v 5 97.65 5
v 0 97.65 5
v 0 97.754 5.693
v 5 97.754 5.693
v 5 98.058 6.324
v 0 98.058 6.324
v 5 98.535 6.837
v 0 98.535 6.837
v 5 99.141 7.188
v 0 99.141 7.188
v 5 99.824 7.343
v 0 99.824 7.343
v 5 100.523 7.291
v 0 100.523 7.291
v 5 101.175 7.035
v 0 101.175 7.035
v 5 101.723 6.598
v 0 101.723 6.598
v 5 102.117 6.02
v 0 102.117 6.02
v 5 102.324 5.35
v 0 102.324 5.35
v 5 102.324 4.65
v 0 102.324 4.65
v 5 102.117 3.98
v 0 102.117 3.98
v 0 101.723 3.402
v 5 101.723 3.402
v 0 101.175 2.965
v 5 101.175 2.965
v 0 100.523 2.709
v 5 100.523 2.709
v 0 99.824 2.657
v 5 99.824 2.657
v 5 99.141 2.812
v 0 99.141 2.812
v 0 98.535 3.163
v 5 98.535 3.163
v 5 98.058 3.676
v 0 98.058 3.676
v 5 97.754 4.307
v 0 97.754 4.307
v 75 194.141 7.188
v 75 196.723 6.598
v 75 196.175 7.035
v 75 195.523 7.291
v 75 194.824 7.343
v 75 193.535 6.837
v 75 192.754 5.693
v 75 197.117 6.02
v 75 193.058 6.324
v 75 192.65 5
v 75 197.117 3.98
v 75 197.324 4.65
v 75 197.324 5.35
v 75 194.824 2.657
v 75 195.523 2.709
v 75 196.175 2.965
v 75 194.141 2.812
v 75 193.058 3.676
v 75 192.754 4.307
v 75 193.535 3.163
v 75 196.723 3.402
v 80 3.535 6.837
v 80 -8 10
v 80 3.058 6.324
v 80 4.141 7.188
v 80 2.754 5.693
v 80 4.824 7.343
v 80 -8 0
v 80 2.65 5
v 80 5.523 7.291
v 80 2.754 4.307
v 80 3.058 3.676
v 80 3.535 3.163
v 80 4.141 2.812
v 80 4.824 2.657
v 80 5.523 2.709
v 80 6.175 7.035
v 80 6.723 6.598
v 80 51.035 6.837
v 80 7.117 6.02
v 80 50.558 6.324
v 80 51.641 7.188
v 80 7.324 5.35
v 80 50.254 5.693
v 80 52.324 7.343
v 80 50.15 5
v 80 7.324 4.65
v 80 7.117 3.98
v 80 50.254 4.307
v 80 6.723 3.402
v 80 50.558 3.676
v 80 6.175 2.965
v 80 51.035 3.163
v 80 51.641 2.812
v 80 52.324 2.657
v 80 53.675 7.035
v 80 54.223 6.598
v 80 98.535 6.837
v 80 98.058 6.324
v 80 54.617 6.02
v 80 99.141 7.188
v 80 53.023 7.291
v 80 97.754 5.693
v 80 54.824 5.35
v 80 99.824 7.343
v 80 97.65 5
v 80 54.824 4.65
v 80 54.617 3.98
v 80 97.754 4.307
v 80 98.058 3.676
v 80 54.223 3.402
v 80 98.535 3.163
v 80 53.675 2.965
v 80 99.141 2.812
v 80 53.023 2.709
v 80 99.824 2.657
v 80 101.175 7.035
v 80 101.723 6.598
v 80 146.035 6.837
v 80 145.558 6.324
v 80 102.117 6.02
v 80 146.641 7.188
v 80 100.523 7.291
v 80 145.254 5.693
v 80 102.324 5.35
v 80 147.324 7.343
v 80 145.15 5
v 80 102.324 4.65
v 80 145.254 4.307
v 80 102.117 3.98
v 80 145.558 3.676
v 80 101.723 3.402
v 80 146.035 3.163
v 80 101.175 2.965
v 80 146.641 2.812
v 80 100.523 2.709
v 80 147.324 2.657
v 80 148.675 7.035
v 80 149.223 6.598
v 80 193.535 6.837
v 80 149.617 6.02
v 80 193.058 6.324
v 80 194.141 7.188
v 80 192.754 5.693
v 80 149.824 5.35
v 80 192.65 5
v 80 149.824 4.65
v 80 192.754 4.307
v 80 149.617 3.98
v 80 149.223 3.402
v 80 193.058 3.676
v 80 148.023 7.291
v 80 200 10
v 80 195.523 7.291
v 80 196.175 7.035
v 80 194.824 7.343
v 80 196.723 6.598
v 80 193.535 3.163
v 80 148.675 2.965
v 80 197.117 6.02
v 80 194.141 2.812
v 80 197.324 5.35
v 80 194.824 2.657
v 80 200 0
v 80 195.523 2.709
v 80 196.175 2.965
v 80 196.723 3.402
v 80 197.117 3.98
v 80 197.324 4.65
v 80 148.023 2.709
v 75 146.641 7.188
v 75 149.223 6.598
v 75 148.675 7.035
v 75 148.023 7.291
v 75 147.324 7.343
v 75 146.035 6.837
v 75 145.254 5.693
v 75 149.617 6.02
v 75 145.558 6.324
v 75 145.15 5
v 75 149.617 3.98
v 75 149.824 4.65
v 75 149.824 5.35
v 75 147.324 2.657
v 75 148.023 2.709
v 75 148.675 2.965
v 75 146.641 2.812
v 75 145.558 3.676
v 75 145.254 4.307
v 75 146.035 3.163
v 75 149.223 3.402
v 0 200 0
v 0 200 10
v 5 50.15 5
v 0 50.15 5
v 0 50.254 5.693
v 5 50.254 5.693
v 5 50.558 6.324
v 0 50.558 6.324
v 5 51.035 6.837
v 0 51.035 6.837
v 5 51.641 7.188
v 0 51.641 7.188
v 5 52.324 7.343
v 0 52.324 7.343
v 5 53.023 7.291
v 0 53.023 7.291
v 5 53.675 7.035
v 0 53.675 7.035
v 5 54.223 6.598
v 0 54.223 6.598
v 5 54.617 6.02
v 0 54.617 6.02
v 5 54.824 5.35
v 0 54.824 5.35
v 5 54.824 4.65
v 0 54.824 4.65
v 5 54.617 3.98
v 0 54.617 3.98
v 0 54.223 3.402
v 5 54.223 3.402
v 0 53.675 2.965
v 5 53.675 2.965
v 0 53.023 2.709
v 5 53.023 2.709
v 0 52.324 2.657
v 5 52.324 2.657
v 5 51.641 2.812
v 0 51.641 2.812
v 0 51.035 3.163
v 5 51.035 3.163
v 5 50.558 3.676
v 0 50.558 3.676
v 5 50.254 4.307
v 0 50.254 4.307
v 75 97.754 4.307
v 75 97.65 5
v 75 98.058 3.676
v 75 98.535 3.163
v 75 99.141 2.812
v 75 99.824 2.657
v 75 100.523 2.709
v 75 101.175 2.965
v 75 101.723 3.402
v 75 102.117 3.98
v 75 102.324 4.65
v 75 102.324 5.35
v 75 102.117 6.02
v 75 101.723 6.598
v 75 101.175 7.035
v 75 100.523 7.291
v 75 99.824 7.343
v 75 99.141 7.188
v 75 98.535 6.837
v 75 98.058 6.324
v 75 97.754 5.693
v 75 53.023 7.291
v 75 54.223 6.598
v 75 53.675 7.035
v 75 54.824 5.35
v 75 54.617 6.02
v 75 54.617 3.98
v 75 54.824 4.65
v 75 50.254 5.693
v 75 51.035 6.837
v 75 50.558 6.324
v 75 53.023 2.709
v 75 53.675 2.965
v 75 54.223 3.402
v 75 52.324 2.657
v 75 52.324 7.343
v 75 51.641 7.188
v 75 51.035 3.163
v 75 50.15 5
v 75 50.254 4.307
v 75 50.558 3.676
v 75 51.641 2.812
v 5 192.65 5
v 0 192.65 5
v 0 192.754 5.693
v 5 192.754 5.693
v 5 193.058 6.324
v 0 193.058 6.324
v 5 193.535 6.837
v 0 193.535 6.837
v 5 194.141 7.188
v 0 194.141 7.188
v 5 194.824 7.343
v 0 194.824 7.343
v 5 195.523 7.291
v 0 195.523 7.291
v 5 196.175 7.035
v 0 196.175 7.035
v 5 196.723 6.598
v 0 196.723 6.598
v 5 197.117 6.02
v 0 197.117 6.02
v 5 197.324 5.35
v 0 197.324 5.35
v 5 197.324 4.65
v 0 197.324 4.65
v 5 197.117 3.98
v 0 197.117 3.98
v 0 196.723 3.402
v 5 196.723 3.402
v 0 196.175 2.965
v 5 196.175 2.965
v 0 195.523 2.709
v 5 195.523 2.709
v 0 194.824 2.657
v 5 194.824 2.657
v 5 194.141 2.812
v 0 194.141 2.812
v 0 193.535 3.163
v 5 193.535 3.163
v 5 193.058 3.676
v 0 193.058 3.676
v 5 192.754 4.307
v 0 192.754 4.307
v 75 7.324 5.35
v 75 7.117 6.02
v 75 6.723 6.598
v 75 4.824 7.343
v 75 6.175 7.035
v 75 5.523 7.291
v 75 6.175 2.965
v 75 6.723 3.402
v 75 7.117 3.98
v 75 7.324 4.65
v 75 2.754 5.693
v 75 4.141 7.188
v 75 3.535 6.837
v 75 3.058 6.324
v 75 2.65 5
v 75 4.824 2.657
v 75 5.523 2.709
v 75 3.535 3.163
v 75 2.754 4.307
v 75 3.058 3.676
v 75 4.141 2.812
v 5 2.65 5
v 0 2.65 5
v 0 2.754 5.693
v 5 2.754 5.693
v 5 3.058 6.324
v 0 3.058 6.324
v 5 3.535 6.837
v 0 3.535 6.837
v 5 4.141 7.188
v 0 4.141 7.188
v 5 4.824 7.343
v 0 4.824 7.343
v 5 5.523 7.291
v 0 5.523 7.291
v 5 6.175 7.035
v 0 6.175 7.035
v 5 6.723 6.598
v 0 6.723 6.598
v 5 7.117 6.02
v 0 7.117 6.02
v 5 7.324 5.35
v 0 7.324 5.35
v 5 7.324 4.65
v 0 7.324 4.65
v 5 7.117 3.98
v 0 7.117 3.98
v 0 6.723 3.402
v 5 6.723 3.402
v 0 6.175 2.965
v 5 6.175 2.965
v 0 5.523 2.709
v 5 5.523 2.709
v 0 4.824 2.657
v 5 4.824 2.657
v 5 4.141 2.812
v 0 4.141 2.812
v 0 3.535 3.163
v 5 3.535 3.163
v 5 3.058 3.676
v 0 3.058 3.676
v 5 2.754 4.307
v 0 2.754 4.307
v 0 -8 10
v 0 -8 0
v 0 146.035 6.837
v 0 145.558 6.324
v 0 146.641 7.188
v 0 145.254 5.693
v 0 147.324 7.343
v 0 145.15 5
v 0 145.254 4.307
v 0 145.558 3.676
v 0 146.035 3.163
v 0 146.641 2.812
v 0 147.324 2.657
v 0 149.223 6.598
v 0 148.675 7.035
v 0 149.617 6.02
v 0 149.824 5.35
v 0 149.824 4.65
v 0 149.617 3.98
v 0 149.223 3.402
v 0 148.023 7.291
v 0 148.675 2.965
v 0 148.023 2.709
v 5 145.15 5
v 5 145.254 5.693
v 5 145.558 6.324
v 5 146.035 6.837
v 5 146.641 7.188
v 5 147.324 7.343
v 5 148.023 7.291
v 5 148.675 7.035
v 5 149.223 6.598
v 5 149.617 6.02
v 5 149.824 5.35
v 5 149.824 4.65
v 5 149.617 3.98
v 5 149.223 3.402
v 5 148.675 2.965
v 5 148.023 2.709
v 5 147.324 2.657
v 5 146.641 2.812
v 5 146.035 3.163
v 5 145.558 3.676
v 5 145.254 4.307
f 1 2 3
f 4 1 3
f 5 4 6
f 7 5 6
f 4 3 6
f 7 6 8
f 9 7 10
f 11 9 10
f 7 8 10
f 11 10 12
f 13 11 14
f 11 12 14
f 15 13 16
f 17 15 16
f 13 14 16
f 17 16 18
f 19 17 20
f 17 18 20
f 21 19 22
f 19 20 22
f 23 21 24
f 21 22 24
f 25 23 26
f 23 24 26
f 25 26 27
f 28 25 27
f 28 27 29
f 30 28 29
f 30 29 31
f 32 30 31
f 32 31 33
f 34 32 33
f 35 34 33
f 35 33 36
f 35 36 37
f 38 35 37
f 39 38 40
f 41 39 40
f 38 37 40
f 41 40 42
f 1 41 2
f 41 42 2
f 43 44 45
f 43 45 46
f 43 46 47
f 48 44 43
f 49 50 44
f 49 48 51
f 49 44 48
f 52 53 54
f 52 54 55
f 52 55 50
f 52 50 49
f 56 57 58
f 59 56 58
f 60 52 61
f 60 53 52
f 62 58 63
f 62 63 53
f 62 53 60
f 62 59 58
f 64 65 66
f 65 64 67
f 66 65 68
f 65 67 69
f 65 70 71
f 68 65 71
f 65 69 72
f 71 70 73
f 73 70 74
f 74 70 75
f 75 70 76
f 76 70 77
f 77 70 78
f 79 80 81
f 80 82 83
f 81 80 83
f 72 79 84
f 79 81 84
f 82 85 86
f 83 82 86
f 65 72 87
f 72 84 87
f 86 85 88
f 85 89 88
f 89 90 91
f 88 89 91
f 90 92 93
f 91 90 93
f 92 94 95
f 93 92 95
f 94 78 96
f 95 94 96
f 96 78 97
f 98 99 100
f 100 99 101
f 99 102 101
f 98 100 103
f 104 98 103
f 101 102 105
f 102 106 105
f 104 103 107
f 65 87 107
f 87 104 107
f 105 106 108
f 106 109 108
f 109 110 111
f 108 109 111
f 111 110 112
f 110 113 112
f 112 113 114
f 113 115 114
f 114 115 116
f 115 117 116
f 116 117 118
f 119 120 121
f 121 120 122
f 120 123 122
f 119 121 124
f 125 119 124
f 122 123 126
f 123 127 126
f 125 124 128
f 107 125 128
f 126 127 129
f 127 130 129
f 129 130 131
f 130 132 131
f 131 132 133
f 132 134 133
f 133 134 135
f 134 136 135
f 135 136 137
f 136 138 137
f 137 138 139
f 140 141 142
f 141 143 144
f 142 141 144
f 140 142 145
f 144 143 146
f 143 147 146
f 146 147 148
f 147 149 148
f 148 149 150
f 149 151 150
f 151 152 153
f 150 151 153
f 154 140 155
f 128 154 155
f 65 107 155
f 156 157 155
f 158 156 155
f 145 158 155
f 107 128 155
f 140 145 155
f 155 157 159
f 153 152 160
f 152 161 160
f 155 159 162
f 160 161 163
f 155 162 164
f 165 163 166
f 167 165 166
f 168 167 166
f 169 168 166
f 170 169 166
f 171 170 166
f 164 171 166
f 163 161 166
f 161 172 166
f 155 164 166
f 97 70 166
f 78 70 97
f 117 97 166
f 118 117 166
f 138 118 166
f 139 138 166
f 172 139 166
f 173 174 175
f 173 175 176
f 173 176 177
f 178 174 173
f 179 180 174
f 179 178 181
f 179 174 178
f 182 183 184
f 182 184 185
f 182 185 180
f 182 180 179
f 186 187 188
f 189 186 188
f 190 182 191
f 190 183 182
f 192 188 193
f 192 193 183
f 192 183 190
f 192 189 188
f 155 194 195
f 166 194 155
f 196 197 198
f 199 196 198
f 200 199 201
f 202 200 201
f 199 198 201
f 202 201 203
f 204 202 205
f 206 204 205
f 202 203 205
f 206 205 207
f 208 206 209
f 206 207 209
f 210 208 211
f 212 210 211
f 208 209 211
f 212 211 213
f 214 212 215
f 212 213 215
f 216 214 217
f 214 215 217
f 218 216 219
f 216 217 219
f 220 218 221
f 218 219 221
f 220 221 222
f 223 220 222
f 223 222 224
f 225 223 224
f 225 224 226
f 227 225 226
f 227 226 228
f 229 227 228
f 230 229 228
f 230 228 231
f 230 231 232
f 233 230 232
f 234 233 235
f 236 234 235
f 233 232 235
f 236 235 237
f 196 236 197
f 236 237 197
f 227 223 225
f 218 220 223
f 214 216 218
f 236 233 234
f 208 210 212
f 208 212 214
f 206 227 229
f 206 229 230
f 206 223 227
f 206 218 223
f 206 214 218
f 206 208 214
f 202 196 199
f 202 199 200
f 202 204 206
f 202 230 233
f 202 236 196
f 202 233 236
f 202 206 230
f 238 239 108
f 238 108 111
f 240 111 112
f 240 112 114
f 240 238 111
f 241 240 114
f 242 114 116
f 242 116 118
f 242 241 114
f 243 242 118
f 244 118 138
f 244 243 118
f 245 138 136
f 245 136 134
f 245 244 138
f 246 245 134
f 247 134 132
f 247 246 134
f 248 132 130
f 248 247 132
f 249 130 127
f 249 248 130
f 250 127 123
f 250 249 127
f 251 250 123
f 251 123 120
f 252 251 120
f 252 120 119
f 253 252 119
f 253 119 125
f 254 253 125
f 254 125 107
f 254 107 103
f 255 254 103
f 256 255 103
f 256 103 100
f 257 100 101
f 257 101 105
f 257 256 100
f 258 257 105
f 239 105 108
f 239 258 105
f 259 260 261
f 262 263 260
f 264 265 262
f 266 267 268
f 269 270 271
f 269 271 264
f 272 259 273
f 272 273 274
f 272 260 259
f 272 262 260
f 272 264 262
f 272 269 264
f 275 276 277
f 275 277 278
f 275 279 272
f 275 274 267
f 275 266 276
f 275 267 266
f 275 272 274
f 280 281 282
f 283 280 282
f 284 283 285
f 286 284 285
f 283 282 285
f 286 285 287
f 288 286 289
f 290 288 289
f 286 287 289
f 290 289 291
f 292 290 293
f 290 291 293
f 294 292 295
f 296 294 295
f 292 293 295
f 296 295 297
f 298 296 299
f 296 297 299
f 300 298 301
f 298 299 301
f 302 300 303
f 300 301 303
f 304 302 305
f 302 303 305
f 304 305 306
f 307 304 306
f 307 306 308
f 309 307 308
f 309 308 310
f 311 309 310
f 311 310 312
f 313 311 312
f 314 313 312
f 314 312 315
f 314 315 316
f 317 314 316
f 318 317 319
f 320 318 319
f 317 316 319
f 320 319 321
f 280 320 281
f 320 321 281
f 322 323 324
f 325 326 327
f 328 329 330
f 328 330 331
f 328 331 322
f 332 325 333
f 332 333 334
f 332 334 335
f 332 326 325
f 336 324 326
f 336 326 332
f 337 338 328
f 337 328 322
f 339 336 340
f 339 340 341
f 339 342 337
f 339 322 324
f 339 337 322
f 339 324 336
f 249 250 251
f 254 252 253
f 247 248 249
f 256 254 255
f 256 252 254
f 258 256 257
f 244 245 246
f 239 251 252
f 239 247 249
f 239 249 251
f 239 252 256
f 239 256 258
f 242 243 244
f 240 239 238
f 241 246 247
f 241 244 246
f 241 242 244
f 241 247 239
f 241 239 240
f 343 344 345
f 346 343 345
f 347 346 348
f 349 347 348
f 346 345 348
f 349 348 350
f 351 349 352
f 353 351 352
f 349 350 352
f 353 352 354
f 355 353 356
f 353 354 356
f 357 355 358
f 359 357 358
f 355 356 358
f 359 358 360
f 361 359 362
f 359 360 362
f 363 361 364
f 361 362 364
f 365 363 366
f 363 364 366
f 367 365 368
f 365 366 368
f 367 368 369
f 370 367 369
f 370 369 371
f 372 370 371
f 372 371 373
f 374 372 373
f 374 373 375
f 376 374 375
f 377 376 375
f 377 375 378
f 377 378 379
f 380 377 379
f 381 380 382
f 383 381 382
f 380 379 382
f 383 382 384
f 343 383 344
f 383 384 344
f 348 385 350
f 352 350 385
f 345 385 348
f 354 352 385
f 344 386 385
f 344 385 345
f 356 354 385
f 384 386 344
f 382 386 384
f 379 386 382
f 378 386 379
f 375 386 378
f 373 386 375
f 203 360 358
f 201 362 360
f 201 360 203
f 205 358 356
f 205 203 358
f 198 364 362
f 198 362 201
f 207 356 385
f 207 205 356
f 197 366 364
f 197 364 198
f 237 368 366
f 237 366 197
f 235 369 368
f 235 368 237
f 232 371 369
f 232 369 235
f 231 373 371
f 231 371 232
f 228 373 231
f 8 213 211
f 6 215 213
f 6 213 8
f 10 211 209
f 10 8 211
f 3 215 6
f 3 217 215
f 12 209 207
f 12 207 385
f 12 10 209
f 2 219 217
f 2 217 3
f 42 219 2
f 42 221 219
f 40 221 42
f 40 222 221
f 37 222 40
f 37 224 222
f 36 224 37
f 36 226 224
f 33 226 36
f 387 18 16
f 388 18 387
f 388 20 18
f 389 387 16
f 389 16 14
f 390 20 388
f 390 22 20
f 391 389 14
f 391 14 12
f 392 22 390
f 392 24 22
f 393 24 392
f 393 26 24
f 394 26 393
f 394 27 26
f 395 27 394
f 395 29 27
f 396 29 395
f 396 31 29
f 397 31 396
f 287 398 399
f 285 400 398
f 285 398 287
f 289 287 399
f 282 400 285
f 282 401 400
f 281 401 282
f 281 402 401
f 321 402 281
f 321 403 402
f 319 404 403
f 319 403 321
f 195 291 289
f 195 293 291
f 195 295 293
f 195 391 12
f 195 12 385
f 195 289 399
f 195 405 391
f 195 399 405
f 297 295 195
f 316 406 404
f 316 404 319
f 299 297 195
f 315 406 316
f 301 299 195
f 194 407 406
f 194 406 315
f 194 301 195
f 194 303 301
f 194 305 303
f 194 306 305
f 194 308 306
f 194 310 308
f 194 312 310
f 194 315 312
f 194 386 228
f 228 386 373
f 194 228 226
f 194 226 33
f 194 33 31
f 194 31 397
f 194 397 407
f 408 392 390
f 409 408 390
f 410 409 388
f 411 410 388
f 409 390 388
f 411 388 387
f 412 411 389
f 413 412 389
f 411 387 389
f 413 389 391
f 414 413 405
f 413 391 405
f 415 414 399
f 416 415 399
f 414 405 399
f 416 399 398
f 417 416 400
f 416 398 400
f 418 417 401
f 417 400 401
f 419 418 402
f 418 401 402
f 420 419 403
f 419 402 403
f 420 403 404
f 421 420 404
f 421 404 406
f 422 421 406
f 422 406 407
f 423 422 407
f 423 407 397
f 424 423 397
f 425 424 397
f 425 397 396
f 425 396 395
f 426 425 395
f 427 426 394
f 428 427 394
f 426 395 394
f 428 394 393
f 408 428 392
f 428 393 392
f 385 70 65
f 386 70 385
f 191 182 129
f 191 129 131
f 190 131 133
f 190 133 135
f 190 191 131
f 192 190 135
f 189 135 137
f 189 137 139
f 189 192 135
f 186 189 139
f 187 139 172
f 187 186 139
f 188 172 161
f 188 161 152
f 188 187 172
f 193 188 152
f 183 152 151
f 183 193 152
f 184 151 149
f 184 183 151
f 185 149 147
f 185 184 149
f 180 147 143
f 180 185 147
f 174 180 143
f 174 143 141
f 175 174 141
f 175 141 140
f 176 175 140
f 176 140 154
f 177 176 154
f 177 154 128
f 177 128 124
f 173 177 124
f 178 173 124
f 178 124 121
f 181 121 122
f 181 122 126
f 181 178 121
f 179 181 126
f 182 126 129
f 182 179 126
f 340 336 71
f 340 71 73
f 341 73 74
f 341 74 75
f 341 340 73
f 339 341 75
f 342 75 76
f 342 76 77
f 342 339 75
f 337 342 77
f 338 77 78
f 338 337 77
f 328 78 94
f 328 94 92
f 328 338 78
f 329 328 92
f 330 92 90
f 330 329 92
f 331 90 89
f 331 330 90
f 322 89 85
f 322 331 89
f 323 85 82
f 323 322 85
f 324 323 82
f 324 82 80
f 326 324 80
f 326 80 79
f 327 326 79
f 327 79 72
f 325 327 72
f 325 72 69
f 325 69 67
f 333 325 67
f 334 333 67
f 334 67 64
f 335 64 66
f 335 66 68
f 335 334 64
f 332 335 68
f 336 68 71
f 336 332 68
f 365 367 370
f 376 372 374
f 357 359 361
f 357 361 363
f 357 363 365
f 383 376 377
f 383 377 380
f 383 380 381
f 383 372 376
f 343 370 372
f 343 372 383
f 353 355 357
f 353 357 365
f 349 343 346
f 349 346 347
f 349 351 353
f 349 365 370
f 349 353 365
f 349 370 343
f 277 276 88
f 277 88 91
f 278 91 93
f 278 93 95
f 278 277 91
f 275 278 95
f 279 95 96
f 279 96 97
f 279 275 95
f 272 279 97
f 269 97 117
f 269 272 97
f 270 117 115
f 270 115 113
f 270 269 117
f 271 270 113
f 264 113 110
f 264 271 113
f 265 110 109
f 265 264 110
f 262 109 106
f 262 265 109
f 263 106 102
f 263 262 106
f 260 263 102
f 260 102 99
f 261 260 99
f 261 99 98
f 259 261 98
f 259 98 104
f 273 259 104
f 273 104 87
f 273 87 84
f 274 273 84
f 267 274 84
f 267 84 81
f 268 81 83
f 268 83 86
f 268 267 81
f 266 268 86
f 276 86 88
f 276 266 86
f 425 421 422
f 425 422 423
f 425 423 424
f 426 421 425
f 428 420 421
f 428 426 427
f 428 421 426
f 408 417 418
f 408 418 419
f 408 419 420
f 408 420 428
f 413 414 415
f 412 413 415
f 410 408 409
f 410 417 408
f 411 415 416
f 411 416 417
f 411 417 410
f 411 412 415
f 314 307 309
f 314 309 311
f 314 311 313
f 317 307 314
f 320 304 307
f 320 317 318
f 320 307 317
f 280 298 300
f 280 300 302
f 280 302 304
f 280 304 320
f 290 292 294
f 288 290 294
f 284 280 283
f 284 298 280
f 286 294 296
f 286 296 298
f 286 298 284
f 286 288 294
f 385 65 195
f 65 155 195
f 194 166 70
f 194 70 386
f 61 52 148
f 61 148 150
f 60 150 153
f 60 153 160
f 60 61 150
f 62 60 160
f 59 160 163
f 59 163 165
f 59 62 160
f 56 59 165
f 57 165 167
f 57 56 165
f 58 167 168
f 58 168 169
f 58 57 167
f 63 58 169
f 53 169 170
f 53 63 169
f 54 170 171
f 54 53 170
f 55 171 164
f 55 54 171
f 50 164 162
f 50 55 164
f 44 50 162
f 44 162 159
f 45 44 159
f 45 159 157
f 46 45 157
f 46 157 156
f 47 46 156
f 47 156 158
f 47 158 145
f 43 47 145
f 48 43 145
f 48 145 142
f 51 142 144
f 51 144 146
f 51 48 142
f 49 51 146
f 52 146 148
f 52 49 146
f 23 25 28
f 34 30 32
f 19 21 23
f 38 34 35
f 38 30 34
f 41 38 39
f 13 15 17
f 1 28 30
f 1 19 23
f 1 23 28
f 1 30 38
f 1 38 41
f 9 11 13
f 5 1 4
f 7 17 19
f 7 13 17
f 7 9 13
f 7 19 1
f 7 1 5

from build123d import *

# Parameters (mm, degrees)
CROQUIS1_W              = 80
CROQUIS1_H              = 200
SALIENTE_EXTRUIR1_DEPTH = 10
CROQUIS3_R              = 2.35
CORTAR_EXTRUIR2_DEPTH   = 5
CORTAR_EXTRUIR3_START   = -5
CROQUIS4_R              = 2.35
CORTAR_EXTRUIR3_DEPTH   = 5
CROQUIS5_W              = 80
CROQUIS5_H              = 8
SALIENTE_EXTRUIR2_DEPTH = 10


with BuildPart() as part:
    # Croquis1 → Saliente-Extruir1 (new body)
    with BuildSketch(Plane.XY):
        with Locations((40, 100)):
            Rectangle(CROQUIS1_W, CROQUIS1_H)
    extrude(amount=SALIENTE_EXTRUIR1_DEPTH)

    # Croquis3 → Cortar-Extruir2 (cut)
    with BuildSketch(Plane.ZY):
        with Locations(Location((5, 195, 0), (0, 0, 270))):
            Circle(CROQUIS3_R)
        with Locations(Location((5, 147.5, 0), (0, 0, 270))):
            Circle(CROQUIS3_R)
        with Locations(Location((5, 100, 0), (0, 0, 270))):
            Circle(CROQUIS3_R)
        with Locations(Location((5, 52.5, 0), (0, 0, 270))):
            Circle(CROQUIS3_R)
        with Locations(Location((5, 5, 0), (0, 0, 270))):
            Circle(CROQUIS3_R)
    extrude(amount=-CORTAR_EXTRUIR2_DEPTH, mode=Mode.SUBTRACT)

    # Croquis4 → Cortar-Extruir3 (cut)
    with BuildSketch(Plane(origin=(80, 0, 0), x_dir=(0, 0, -1), z_dir=(1, 0, 0)).offset(CORTAR_EXTRUIR3_START)):
        with Locations(Location((-5, 195, 0), (0, 0, 270))):
            Circle(CROQUIS4_R)
        with Locations(Location((-5, 147.5, 0), (0, 0, 270))):
            Circle(CROQUIS4_R)
        with Locations(Location((-5, 100, 0), (0, 0, 270))):
            Circle(CROQUIS4_R)
        with Locations(Location((-5, 52.5, 0), (0, 0, 270))):
            Circle(CROQUIS4_R)
        with Locations(Location((-5, 5, 0), (0, 0, 270))):
            Circle(CROQUIS4_R)
    extrude(amount=CORTAR_EXTRUIR3_DEPTH, mode=Mode.SUBTRACT)

    # Croquis5 → Saliente-Extruir2 (add)
    with BuildSketch(Plane(origin=(0, 0, 0), x_dir=(-1, 0, 0), z_dir=(0, 0, -1))):
        with Locations((-40, -4)):
            Rectangle(CROQUIS5_W, CROQUIS5_H)
    extrude(amount=-SALIENTE_EXTRUIR2_DEPTH)


solid = part.part
